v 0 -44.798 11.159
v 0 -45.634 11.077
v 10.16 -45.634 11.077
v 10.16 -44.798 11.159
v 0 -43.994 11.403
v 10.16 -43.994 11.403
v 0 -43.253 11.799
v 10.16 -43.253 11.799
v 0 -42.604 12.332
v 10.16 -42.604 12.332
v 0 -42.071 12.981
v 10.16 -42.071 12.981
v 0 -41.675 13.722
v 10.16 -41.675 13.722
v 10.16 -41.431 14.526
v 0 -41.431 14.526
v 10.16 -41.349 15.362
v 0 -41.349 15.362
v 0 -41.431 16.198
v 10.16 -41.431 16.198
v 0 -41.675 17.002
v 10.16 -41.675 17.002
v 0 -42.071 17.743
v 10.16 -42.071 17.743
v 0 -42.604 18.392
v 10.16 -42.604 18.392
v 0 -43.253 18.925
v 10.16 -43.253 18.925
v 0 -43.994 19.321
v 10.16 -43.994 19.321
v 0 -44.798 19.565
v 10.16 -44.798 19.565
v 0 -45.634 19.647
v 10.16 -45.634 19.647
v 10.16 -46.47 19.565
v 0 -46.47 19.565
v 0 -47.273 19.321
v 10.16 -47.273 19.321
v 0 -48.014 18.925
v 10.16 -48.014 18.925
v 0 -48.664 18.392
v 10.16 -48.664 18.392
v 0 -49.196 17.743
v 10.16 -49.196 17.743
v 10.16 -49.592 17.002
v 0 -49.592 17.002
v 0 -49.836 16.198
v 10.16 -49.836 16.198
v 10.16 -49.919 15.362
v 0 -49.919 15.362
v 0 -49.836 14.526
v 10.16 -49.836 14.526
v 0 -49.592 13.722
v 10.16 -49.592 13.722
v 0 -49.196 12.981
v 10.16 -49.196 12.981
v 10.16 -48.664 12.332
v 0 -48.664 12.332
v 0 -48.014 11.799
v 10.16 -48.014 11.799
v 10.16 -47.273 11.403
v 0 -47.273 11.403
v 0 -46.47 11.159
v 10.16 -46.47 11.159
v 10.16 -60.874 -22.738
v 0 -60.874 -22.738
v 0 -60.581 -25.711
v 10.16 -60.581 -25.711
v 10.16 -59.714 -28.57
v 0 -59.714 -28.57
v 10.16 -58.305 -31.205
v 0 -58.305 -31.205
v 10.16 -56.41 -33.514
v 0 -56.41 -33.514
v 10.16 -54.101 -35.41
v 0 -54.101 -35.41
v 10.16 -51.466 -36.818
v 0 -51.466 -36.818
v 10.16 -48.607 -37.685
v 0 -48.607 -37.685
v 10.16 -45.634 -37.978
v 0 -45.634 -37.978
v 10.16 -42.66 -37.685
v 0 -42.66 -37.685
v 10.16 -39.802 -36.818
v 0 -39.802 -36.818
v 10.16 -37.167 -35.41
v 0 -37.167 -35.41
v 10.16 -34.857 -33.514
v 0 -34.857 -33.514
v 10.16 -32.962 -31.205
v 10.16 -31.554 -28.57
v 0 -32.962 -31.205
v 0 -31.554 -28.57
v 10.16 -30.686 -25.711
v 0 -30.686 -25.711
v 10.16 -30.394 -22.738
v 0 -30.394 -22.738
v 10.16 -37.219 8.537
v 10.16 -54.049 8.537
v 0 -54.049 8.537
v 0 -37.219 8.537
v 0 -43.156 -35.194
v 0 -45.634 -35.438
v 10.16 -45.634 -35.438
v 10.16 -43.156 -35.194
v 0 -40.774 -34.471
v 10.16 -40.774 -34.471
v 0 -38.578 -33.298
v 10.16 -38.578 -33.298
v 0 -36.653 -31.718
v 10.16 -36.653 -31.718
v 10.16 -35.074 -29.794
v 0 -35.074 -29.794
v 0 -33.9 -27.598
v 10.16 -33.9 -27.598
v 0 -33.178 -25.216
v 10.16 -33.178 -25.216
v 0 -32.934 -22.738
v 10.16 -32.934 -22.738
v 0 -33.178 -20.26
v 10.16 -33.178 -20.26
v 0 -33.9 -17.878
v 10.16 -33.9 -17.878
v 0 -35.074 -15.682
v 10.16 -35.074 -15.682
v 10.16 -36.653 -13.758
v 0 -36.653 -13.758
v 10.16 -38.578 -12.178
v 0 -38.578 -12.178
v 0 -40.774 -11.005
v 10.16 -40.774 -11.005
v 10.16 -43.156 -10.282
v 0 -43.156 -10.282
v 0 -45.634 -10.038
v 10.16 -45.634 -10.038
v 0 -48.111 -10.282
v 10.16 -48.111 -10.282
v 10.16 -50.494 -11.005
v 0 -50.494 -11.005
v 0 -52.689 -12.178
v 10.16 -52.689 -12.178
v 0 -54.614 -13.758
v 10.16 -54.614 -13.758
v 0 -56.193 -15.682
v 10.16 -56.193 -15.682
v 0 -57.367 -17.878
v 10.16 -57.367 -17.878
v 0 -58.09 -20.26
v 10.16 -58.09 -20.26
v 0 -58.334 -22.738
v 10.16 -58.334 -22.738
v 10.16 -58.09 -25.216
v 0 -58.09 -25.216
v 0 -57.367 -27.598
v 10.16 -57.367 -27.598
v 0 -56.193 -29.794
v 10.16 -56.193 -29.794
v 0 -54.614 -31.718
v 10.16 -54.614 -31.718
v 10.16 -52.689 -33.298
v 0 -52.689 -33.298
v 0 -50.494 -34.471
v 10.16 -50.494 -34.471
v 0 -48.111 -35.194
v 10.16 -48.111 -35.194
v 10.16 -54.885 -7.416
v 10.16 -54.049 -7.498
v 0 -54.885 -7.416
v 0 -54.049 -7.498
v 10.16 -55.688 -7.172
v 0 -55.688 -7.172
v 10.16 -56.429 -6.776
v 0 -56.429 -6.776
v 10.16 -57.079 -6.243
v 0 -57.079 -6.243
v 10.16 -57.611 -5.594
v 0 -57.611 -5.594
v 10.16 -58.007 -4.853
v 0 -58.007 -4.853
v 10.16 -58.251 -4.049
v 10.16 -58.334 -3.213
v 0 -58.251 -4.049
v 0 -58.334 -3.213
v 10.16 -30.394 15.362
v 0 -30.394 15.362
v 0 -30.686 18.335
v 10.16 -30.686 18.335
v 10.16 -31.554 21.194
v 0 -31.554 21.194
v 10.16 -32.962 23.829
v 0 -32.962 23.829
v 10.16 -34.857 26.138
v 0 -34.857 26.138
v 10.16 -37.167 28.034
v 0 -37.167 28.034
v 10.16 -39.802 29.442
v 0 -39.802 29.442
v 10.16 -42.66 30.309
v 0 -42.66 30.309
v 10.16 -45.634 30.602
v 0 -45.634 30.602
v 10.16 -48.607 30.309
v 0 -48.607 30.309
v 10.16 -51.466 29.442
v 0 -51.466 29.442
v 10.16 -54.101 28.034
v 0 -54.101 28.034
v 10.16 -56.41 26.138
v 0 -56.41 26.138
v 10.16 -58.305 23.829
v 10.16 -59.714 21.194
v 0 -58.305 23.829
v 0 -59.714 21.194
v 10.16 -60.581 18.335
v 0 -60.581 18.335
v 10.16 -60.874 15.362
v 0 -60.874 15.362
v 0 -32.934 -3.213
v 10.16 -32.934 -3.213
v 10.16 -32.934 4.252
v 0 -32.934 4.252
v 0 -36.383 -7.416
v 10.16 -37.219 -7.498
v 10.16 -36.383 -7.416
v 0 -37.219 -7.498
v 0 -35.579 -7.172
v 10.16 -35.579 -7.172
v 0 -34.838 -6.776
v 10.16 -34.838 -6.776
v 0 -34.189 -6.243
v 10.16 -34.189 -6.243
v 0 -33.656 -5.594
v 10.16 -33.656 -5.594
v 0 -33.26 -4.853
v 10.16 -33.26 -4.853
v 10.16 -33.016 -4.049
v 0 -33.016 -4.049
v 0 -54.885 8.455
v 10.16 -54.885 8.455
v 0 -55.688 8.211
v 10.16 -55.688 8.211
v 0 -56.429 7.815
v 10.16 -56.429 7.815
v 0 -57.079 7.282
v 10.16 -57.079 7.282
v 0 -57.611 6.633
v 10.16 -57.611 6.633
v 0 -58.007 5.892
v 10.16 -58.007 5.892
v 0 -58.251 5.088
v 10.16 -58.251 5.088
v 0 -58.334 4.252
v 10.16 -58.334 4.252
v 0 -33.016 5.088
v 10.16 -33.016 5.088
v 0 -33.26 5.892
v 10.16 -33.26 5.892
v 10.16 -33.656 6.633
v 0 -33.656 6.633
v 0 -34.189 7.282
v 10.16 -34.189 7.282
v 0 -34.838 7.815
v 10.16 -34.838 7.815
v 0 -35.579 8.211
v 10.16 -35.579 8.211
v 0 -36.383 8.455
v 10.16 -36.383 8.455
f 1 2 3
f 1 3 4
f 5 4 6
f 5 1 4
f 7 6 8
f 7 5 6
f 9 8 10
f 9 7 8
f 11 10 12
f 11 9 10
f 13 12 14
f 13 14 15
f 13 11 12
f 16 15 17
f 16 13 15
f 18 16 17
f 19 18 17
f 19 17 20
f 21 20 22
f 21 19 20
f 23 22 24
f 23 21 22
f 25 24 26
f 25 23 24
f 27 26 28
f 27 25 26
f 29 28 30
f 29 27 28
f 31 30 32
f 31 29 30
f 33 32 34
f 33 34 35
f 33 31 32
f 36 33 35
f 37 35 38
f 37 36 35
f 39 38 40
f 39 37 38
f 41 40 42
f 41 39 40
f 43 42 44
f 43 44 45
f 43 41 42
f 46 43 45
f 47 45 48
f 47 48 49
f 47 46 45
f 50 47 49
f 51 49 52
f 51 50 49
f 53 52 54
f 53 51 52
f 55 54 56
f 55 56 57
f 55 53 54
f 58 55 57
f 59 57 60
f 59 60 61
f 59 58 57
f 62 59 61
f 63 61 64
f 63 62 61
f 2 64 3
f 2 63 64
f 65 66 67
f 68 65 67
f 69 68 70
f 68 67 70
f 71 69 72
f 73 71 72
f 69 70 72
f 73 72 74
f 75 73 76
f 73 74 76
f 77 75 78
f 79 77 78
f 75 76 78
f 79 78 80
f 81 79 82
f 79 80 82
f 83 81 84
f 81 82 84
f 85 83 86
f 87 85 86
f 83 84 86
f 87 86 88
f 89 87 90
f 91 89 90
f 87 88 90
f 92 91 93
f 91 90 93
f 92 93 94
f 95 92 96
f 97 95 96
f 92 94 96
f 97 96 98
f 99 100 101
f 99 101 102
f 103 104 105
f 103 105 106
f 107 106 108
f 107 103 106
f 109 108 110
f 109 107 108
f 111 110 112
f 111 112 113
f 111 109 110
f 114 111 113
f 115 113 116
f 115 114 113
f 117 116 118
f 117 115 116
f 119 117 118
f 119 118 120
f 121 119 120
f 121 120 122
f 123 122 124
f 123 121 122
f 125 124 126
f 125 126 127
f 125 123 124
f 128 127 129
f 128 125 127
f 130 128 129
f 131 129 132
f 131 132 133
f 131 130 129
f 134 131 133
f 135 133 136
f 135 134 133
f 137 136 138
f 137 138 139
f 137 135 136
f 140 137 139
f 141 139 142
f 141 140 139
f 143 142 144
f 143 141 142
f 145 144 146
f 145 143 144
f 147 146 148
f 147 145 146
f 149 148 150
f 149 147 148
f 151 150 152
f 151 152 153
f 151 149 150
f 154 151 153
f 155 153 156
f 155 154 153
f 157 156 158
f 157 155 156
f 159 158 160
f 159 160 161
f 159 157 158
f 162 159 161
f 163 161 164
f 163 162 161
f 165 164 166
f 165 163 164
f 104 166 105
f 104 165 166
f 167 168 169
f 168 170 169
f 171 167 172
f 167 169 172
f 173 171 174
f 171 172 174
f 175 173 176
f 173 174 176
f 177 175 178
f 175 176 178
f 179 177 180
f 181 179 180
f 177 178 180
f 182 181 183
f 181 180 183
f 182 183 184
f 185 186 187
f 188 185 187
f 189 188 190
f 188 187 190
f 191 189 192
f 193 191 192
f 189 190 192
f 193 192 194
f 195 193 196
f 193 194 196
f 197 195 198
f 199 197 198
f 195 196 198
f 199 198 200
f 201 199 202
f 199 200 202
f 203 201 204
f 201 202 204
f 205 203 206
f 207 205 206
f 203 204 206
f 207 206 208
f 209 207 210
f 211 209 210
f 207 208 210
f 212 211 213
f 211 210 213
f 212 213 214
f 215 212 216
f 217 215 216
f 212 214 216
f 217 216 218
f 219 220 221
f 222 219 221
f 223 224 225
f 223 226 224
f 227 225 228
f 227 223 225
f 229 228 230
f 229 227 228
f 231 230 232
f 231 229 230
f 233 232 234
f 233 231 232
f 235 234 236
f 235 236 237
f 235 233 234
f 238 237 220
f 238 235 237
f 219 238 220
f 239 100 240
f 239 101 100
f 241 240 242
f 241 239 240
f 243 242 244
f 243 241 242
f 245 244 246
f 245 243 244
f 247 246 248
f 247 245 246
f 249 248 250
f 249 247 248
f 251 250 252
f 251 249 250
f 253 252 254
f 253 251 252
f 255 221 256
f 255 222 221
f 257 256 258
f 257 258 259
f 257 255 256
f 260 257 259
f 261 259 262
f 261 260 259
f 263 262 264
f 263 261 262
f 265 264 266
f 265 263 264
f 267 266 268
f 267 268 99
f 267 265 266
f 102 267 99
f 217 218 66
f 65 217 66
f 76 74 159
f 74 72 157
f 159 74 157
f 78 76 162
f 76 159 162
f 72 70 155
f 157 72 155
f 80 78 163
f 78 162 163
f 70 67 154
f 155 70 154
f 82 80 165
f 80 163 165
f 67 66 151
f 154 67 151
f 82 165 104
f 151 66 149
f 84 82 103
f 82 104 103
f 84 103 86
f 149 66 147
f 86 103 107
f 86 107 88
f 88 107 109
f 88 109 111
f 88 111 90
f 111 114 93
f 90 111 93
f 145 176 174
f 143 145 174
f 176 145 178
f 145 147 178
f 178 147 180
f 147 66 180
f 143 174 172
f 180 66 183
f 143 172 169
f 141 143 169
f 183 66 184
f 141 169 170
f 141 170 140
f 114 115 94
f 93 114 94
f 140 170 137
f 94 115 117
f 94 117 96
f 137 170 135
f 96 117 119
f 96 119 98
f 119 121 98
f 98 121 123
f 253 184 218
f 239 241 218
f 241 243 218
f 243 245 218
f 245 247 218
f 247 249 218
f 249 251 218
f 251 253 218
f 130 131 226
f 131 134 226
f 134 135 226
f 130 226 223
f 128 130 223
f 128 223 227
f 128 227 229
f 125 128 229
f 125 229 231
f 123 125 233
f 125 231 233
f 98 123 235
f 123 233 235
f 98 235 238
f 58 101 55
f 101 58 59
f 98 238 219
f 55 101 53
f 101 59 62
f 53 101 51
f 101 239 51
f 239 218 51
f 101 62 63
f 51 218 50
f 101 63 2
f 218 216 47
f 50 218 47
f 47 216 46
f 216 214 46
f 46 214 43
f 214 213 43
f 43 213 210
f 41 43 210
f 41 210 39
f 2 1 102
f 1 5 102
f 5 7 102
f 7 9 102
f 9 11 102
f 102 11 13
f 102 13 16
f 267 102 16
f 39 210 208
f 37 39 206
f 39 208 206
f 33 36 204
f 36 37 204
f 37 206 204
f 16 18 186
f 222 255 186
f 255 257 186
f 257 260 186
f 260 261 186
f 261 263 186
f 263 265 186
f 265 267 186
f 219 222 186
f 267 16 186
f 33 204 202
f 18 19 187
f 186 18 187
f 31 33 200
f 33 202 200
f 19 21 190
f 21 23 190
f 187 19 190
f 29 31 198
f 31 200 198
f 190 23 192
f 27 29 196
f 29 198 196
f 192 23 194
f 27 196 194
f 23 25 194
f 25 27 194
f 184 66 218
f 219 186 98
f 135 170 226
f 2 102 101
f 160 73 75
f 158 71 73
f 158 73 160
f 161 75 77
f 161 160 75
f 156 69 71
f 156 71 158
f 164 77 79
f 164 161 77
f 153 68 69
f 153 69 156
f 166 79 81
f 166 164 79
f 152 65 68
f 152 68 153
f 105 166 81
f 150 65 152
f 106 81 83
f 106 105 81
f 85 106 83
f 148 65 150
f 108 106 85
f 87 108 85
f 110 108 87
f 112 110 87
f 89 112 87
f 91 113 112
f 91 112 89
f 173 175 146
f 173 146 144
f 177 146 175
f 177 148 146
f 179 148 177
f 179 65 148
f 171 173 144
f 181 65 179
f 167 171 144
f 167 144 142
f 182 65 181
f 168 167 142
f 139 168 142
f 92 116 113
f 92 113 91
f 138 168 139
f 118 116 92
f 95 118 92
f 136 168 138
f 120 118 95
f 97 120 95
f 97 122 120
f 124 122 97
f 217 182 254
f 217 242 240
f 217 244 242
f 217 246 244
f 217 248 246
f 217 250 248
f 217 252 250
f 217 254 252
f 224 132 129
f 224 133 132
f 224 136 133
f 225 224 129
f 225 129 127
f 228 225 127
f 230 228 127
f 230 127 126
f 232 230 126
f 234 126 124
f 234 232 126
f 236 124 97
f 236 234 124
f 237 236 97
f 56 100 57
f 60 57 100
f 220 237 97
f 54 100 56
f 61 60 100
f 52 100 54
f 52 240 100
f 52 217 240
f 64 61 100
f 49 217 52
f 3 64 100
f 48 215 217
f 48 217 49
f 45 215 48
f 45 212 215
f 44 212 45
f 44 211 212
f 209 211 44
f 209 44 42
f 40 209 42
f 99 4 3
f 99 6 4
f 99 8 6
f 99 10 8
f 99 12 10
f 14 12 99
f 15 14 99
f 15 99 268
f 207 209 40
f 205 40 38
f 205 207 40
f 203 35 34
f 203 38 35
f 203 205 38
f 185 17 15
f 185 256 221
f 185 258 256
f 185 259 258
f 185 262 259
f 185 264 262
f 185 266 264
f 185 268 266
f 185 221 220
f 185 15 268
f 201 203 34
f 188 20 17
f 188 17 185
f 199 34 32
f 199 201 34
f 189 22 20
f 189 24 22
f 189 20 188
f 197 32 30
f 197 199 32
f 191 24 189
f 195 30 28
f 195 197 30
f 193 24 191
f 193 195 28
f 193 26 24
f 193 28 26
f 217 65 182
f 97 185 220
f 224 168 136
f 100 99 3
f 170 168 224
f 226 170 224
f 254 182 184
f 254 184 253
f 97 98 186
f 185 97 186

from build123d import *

# Parameters (mm, degrees)
SKETCH1_R           = 12.7
SKETCH1_R_2         = 4.28498
BOSS_EXTRUDE1_DEPTH = 10.159999949
SKETCH2_W           = 25.4
SKETCH2_H           = 16.03502
CUT_EXTRUDE1_DEPTH  = 73.464875935
FILLET1_R           = 4.28498


with BuildPart() as part:
    # Sketch1 → Boss-Extrude1 (new body)
    with BuildSketch(Plane.YZ):
        with BuildLine():
            Line((-60.873619371, 15.361912765), (-60.873619371, -22.738087235))
            ThreePointArc((-60.873619371, -22.738087235), (-45.633619371, -37.978087235), (-30.393619371, -22.738087235))
            Line((-30.393619371, -22.738087235), (-30.393619371, 15.361912765))
            ThreePointArc((-30.393619371, 15.361912765), (-45.633619371, 30.601912765), (-60.873619371, 15.361912765))
        make_face()
        with Locations(Location((-45.633619371, -22.738087235, 0), (0, 0, 270))):
            Circle(SKETCH1_R, mode=Mode.SUBTRACT)
        with Locations(Location((-45.633619371, 15.361912765, 0), (0, 0, 270))):
            Circle(SKETCH1_R_2, mode=Mode.SUBTRACT)
    extrude(amount=BOSS_EXTRUDE1_DEPTH)

    # Sketch2 → Cut-Extrude1 (cut, through all)
    with BuildSketch(Plane.YZ.offset(10.159999949)):
        with Locations((-45.633619371, 0.519422765)):
            Rectangle(SKETCH2_W, SKETCH2_H)
    extrude(amount=-CUT_EXTRUDE1_DEPTH, mode=Mode.SUBTRACT)

    # Fillet1
    fillet1_edges = [part.edges().sort_by_distance(p)[0] for p in [
        (5.079999975, -58.333619371, -7.498087235),
        (5.079999975, -58.333619371, 8.536932765),
        (5.079999975, -32.933619371, 8.536932765),
        (5.079999975, -32.933619371, -7.498087235),
    ]]
    fillet(fillet1_edges, radius=FILLET1_R)


solid = part.part
